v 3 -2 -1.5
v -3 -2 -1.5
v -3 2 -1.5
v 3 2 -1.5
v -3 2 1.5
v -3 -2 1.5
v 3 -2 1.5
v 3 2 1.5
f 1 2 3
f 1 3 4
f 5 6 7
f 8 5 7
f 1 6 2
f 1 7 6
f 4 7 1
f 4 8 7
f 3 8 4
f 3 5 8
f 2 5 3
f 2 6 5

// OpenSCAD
width = 6;
depth = 4;
height = 3;
centered = true;

linear_extrude(height = height, center = centered)
    square([width, depth], center = true);
